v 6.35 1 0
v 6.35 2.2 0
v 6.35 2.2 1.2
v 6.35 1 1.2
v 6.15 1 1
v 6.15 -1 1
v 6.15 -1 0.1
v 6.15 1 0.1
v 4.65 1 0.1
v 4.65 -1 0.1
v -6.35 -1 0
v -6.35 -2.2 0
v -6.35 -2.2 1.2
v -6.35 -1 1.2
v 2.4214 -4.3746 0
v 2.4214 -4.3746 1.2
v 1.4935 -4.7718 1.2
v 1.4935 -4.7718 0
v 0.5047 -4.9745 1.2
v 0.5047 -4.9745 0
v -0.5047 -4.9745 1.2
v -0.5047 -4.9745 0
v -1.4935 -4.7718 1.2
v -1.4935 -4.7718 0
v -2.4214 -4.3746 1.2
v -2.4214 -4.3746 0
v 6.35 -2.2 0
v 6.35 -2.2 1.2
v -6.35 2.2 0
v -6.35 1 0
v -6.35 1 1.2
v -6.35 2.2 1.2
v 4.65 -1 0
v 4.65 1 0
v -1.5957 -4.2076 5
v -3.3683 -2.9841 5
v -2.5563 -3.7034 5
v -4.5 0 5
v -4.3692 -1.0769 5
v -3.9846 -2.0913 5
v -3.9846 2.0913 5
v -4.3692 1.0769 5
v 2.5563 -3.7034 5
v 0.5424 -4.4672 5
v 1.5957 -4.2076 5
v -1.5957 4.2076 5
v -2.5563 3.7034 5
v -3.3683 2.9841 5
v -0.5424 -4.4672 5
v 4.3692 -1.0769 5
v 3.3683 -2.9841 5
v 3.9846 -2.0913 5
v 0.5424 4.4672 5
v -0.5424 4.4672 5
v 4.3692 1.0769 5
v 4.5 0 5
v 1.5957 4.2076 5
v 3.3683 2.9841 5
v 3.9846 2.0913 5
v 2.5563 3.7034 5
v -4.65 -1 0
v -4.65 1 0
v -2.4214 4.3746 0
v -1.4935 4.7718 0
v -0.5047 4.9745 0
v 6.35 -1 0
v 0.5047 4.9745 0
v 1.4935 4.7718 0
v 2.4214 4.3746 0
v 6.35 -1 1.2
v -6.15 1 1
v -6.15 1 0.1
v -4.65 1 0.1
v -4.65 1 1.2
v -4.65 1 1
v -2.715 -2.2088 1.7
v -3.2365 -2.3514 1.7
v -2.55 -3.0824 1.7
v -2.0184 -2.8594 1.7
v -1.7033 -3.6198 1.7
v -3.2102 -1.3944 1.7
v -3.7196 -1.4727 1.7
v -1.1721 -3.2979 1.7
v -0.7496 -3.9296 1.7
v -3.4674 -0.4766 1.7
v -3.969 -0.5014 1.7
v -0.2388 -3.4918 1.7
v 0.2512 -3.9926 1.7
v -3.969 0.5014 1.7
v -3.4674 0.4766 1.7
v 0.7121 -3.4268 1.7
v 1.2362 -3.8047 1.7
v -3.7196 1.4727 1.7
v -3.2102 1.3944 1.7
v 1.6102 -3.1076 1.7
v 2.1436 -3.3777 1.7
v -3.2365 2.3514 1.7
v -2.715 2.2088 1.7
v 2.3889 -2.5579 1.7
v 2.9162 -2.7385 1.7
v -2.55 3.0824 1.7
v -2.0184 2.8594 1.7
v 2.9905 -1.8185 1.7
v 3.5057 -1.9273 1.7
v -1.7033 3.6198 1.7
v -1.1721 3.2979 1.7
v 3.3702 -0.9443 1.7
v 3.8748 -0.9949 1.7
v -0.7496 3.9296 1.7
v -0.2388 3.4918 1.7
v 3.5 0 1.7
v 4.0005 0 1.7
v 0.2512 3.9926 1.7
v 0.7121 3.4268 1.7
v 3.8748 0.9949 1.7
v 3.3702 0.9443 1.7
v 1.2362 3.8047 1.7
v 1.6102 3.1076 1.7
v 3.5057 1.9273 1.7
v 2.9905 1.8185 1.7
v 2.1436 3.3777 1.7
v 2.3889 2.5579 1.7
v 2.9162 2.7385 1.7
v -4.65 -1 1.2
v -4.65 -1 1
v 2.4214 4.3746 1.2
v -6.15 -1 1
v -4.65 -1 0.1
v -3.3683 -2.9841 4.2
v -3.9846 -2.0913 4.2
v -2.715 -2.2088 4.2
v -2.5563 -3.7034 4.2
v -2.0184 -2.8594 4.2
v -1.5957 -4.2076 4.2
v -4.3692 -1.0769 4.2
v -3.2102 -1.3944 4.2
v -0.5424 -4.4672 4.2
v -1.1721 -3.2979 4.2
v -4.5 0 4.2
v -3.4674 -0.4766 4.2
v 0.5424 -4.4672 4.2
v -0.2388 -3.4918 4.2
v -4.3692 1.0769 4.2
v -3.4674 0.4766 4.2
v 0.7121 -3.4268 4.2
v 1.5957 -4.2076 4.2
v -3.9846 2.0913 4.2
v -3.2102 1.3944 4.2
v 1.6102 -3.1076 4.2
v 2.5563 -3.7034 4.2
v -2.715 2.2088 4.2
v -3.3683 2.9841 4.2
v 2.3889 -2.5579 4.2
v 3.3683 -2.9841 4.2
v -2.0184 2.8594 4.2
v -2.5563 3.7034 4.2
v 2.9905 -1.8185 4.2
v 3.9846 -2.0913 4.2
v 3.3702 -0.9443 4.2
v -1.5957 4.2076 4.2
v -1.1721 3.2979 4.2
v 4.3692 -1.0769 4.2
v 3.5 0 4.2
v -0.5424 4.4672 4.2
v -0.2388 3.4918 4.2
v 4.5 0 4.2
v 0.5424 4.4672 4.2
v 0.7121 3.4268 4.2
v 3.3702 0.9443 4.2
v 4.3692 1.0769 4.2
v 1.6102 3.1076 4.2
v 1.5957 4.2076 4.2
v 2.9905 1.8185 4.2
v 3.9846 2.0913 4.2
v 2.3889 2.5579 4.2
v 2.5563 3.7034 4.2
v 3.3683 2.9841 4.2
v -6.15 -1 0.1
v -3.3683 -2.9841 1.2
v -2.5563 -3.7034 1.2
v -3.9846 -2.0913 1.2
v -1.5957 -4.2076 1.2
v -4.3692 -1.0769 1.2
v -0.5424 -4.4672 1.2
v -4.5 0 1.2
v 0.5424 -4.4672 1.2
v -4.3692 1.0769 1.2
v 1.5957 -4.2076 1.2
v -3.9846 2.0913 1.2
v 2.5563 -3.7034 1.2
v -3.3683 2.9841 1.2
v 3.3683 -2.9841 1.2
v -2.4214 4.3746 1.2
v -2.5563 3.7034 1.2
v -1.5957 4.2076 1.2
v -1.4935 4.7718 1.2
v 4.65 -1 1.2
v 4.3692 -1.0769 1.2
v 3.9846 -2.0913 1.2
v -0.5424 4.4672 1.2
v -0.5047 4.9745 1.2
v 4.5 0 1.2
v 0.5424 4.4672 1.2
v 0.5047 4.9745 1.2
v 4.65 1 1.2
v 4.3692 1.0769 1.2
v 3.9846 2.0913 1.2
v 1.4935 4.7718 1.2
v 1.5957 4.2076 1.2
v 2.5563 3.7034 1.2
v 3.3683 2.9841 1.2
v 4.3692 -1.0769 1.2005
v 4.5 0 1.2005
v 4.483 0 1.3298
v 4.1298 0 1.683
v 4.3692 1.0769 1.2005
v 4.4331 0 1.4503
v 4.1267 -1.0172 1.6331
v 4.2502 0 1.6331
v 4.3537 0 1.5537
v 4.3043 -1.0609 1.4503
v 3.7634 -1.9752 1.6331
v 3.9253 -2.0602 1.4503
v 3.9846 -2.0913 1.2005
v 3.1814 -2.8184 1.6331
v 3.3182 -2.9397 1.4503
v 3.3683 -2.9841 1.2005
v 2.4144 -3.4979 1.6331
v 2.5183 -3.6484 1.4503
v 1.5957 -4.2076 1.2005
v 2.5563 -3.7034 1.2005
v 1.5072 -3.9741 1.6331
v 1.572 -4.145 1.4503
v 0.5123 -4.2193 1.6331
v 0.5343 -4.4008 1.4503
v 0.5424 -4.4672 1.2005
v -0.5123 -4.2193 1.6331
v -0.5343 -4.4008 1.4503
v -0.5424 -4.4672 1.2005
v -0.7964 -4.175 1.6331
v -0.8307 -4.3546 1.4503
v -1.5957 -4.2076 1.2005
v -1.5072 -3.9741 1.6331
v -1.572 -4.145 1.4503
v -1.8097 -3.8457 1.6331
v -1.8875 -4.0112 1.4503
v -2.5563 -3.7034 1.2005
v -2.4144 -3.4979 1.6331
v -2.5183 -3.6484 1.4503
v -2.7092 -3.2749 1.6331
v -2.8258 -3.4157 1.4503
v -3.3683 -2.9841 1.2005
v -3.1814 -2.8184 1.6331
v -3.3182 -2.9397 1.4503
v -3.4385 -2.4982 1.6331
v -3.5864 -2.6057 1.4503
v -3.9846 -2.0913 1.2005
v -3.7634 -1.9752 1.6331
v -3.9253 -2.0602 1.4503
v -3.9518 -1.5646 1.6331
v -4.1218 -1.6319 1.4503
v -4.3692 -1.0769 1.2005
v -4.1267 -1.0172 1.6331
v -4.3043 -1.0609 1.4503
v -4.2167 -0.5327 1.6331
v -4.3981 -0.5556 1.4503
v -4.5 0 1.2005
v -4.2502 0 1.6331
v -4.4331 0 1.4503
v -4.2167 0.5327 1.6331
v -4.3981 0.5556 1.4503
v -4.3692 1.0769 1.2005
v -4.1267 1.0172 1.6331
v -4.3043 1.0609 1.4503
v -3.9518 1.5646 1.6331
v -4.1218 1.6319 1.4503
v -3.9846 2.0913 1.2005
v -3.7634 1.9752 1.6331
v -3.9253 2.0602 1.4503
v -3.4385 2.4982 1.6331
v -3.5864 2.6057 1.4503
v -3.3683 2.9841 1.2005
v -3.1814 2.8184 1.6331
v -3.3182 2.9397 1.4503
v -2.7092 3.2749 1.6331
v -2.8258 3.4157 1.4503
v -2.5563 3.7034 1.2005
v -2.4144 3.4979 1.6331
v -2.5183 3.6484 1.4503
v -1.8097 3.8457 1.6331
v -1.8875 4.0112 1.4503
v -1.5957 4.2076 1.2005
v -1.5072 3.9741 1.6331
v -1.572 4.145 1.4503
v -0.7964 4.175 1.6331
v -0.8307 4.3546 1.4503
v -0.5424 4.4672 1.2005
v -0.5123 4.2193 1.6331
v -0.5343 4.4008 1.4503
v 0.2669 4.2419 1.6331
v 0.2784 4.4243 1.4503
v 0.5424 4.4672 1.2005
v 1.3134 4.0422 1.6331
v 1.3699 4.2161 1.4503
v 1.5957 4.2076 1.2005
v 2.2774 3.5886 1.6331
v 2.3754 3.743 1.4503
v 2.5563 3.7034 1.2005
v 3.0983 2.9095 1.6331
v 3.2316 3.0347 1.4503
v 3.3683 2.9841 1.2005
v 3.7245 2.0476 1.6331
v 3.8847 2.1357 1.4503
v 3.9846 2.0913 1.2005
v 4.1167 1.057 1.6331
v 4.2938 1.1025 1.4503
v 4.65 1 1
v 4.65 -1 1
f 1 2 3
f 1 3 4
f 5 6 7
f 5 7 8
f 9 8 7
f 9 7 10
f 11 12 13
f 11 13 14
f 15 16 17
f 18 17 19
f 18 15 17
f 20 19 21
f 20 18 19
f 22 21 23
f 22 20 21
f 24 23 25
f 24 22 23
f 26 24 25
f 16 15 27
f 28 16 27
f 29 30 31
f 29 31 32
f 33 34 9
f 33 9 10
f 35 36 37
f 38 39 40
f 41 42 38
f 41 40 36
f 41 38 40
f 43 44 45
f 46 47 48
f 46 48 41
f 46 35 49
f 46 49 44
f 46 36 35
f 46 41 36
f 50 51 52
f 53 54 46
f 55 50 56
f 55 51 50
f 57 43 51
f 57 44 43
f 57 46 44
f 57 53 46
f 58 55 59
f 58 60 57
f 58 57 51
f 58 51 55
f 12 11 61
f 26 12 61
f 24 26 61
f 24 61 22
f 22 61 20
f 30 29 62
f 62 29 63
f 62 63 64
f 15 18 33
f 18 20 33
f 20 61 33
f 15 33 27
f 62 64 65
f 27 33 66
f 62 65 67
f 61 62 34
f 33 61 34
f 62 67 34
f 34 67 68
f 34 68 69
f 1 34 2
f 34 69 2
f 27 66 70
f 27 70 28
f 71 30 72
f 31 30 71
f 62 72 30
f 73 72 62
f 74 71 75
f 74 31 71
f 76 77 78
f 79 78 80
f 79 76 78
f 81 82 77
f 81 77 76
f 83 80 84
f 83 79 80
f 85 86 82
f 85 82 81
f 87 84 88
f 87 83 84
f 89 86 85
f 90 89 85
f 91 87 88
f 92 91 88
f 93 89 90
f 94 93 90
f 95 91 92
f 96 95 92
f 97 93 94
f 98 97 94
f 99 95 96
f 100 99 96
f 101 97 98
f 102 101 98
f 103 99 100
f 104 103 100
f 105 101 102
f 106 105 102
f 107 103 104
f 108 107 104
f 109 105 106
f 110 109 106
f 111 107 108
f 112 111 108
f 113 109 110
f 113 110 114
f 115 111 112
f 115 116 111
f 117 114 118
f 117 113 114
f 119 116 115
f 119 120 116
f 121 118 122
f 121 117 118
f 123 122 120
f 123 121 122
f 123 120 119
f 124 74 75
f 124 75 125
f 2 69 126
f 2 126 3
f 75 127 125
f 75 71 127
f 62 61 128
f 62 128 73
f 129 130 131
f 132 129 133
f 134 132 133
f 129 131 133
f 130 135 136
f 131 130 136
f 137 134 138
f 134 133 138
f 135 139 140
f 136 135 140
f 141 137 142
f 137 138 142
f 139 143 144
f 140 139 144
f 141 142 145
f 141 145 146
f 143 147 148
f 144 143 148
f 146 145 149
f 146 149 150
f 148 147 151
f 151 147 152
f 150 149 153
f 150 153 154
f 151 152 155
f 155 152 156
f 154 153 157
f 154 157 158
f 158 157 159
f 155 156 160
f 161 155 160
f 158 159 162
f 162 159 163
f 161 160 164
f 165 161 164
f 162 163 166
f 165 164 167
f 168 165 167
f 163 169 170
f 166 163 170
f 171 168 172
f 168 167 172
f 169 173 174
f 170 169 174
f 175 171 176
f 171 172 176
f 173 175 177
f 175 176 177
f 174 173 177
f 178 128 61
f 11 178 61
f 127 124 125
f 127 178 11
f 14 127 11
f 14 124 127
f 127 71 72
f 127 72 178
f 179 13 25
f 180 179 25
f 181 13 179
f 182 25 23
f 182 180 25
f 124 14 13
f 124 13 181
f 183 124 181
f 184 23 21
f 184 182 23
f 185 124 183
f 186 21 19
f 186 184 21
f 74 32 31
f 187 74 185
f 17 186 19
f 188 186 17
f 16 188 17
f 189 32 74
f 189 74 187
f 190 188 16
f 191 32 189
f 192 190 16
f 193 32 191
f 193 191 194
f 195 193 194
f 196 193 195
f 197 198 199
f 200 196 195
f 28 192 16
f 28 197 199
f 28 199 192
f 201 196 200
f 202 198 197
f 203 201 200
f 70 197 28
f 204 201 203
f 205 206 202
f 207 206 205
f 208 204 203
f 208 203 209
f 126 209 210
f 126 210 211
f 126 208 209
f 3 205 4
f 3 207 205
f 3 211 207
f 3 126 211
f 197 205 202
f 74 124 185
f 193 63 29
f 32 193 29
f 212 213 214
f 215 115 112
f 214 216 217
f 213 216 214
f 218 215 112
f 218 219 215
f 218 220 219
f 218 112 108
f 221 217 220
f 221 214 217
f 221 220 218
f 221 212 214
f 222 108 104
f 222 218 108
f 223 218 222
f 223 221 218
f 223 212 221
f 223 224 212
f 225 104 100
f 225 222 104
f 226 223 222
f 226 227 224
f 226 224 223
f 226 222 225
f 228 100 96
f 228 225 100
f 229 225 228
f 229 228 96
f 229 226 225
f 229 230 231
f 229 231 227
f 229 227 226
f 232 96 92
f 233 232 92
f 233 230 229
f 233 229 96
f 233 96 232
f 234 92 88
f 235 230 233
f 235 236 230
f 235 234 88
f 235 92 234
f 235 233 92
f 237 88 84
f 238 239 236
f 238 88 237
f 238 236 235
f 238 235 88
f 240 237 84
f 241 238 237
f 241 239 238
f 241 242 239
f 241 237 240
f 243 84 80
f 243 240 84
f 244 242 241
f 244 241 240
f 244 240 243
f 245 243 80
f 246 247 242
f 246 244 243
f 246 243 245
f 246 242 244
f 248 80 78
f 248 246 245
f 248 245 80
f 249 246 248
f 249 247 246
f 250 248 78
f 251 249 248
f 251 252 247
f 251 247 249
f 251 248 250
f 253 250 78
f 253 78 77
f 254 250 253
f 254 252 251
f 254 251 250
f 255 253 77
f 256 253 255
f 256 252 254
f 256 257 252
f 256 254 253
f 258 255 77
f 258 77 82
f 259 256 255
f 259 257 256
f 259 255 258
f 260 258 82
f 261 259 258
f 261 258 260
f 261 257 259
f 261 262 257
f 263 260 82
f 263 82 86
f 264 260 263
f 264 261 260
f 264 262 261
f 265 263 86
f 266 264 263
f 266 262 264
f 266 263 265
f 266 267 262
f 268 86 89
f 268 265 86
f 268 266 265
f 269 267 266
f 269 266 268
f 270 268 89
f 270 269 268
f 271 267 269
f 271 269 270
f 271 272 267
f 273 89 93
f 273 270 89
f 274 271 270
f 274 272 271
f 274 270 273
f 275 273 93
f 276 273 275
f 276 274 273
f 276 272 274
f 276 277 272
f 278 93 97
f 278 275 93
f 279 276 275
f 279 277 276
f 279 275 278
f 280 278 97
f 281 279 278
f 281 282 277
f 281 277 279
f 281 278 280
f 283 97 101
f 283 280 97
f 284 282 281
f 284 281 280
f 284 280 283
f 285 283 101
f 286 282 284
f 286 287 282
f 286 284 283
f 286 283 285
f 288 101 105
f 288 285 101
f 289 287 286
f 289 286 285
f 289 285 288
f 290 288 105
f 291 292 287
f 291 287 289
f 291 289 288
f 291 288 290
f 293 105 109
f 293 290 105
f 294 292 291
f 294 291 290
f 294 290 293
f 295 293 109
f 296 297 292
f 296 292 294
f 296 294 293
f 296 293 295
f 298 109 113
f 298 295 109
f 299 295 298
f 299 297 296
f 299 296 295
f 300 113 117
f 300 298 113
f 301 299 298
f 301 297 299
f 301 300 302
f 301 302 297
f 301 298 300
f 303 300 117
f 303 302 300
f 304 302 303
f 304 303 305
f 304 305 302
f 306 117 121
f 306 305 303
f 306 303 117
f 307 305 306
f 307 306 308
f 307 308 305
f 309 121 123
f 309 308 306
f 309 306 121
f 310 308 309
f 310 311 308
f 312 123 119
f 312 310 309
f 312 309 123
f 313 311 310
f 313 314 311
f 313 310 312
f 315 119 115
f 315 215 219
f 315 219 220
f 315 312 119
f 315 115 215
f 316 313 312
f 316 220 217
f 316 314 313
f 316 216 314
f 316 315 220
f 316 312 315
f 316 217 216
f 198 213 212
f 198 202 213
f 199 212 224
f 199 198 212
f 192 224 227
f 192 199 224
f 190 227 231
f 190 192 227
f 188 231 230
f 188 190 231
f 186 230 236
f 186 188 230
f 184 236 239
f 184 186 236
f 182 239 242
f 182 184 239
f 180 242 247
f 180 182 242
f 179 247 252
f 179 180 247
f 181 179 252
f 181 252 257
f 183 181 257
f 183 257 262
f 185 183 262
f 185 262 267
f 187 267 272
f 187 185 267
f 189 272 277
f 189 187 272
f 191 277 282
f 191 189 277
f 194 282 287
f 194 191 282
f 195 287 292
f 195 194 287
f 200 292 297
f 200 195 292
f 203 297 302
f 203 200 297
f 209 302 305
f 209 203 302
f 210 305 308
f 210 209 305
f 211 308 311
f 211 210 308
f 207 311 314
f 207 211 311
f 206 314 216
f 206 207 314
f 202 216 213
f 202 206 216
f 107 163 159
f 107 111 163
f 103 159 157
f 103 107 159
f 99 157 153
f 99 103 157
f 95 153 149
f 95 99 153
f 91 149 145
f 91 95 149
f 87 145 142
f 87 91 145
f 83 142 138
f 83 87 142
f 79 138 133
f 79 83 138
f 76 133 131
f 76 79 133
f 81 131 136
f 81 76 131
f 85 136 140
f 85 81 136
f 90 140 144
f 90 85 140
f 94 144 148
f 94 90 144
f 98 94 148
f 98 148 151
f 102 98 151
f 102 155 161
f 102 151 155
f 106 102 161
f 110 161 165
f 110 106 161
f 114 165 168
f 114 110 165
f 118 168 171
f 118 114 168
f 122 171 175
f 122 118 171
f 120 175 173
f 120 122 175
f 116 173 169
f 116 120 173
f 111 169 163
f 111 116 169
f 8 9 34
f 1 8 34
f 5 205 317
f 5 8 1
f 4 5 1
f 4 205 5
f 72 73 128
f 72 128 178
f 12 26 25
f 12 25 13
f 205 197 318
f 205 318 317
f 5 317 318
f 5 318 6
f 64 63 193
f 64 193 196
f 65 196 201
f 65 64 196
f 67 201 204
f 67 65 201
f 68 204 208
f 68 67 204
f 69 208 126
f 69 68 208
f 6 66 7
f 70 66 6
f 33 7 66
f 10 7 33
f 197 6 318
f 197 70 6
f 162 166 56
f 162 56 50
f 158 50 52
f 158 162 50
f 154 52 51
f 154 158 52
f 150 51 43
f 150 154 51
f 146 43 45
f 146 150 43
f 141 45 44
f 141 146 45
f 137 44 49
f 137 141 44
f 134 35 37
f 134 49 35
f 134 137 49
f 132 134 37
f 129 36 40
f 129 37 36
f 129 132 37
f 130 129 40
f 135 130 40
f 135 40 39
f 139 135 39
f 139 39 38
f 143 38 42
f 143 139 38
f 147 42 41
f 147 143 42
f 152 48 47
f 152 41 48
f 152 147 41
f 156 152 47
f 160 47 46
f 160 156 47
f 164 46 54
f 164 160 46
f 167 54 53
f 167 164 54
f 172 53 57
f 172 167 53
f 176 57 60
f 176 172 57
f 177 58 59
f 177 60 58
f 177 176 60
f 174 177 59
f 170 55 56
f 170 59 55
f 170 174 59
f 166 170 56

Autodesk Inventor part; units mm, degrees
ref_plane "YZ Plane" through (0, 0, 0) normal (1, 0, 0) x (0, 1, 0)
ref_plane "XZ Plane" through (0, 0, 0) normal (0, 1, 0) x (-1, 0, 0)
ref_plane "XY Plane" through (0, 0, 0) normal (0, 0, 1) x (1, 0, 0)
sketch "Sketch1" plane through (0, 0, 0) normal (0, 0, 1) x (1, 0, 0)
  line L0 (-6.35, 5) -> (6.35, 5)
  line L1 (6.35, 5) -> (6.35, -5)
  line L2 (6.35, -5) -> (-6.35, -5)
  line L3 (-6.35, -5) -> (-6.35, 5)
  line L4 (-6.35, 5) -> (6.35, -5) construction
  line L5 (6.35, 5) -> (-6.35, -5) construction
  line L6 (-2.4214, 4.3746) -> (-6.35, 2.2)
  line L7 (-2.4214, -4.3746) -> (-6.35, -2.2)
  line L8 (0, -5) -> (0, 5)
  line L9 (2.4214, 4.3746) -> (6.35, 2.2)
  line L10 (2.4214, -4.3746) -> (6.35, -2.2)
  line L11 (-6.35, 2.2) -> (-6.35, -2.2)
  line L12 (6.35, -2.2) -> (6.35, 2.2)
  arc A0 (-2.4214, -4.3746) -> (2.4214, -4.3746) centre (0, 0) ccw
  arc A1 (2.4214, 4.3746) -> (-2.4214, 4.3746) centre (0, 0) ccw
  point P0 (-1.2915, 5)
  point P1 (-1.2915, -5)
  point P2 (1.2915, 5)
  point P3 (1.2915, -5)
  dimension "d0" = 12.7
  dimension "d1" = 10
  dimension "d3" = 2.8
  dimension "d4" = 2.8
extrude "Extrusion1" add sketch "Sketch1" along normal blind 1.2 contours A1 L9 L1 L10 A0 L8 | L8 A0 L7 L3 L6 A1
sketch "Sketch2" plane through (0, 0, 1.2) normal (0, 0, 1) x (1, 0, 0)
  arc A0 (2.4214, 4.3746) -> (-2.4214, 4.3746) centre (0, 0) ccw projected
  circle A1 centre (0, 0) radius 3.5
  circle A2 centre (0, 0) radius 4.5
  dimension "d7" = 7
  dimension "d8" = 1
extrude "Extrusion2" add sketch "Sketch2" along normal blind 0.5 contours A1 | A2
sketch "Sketch3" plane through (0, 0, 1.7) normal (0, 0, 1) x (1, 0, 0)
  circle A0 centre (0, 0) radius 4.5 projected
  circle A1 centre (0, 0) radius 3.5
  dimension "d11" = 7
extrude "Extrusion3" add sketch "Sketch3" along normal blind 2.5 contours A1
sketch "Sketch4" plane through (0, 0, 4.2) normal (0, 0, 1) x (1, 0, 0)
  circle A0 centre (0, 0) radius 4.5
  dimension "d14" = 9
extrude "Extrusion4" add sketch "Sketch4" along normal blind 0.8
fillet "Fillet1" radius 0.5 1 edges at (-4.5, 0, 1.7)
sketch "Sketch5" plane through (0, 0, 1.2) normal (0, 0, 1) x (1, 0, 0)
  circle A0 centre (0, 0) radius 4.5 projected
  line L0 (-6.35, 2.2) -> (-6.35, -2.2) projected
  line L1 (-6.35, -2.2) -> (-2.4214, -4.3746) projected
  arc A1 (-2.4214, -4.3746) -> (2.4214, -4.3746) centre (0, 0) ccw projected
  line L2 (2.4214, -4.3746) -> (6.35, -2.2) projected
  line L3 (6.35, -2.2) -> (6.35, 2.2) projected
  line L4 (6.35, 2.2) -> (2.4214, 4.3746) projected
  arc A2 (2.4214, 4.3746) -> (-2.4214, 4.3746) centre (0, 0) ccw projected
  line L5 (-2.4214, 4.3746) -> (-6.35, 2.2) projected
  line L6 (-6.35, 2.2) -> (-6.35, -2.2) projected
  line L7 (-6.35, 1) -> (-6.15, 1)
  line L8 (-6.15, 1) -> (-6.15, -1)
  line L9 (-6.15, -1) -> (-6.35, -1)
  line L10 (-6.35, -1) -> (-6.35, 1)
  line L11 (6.35, -1) -> (6.15, -1)
  line L12 (6.15, -1) -> (6.15, 1)
  line L13 (6.15, 1) -> (6.35, 1)
  line L14 (6.35, 1) -> (6.35, -1)
  point P0 (6.35, 0)
  point P1 (-6.35, 0)
  dimension "d18" = 2
  dimension "d19" = 2
  dimension "d20" = 0.2
  dimension "d21" = 0.2
extrude "Extrusion5" cut sketch "Sketch5" against normal through all contours L7 L8 L9 L0 | L3 L11 L12 L13
sketch "Sketch6" plane through (0, 0, 1.2) normal (0, 0, 1) x (1, 0, 0)
  line L0 (-6.15, -1) -> (-6.35, -1) projected
  line L1 (-6.35, -1) -> (-6.35, -2.2) projected
  line L2 (-6.35, -2.2) -> (-2.4214, -4.3746) projected
  arc A0 (-2.4214, -4.3746) -> (2.4214, -4.3746) centre (0, 0) ccw projected
  line L3 (2.4214, -4.3746) -> (6.35, -2.2) projected
  line L4 (6.35, -2.2) -> (6.35, -1) projected
  line L5 (6.35, -1) -> (6.15, -1) projected
  line L6 (6.15, -1) -> (6.15, 1) projected
  line L7 (6.15, 1) -> (6.35, 1) projected
  line L8 (6.35, 1) -> (6.35, 2.2) projected
  line L9 (6.35, 2.2) -> (2.4214, 4.3746) projected
  arc A1 (2.4214, 4.3746) -> (-2.4214, 4.3746) centre (0, 0) ccw projected
  line L10 (-2.4214, 4.3746) -> (-6.35, 2.2) projected
  line L11 (-6.35, 2.2) -> (-6.35, 1) projected
  line L12 (-6.35, 1) -> (-6.15, 1) projected
  line L13 (-6.15, 1) -> (-6.15, -1) projected
  circle A2 centre (0, 0) radius 4.5 projected
  line L14 (-6.15, 1) -> (-4.65, 1)
  line L15 (-4.65, 1) -> (-4.65, -1)
  line L16 (-4.65, -1) -> (-6.15, -1)
  line L17 (-6.15, -1) -> (-6.15, 1)
  line L18 (6.15, -1) -> (4.65, -1)
  line L19 (4.65, -1) -> (4.65, 1)
  line L20 (4.65, 1) -> (6.15, 1)
  line L21 (6.15, 1) -> (6.15, -1)
  dimension "d24" = 1.5
  dimension "d25" = 1.5
extrude "Extrusion6" cut sketch "Sketch6" against normal blind 0.2 contours L13 L14 L15 L16 | L18 L19 L20 L6
sketch "Sketch7" plane through (0, 0, 0) normal (0, 0, -1) x (-1, 0, 0)
  circle A0 centre (0, 0) radius 4 projected
  line L0 (6.35, -1) -> (6.15, -1) projected
  line L1 (6.15, -1) -> (6.15, 1) projected
  line L2 (6.15, 1) -> (6.35, 1) projected
  line L3 (6.35, 2.2) -> (6.35, 1) projected
  line L4 (2.4214, 4.3746) -> (6.35, 2.2) projected
  arc A1 (2.4214, 4.3746) -> (-2.4214, 4.3746) centre (0, 0) ccw projected
  line L5 (-6.35, 2.2) -> (-2.4214, 4.3746) projected
  line L6 (-6.35, 1) -> (-6.35, 2.2) projected
  line L7 (-6.35, 1) -> (-6.15, 1) projected
  line L8 (-6.15, 1) -> (-6.15, -1) projected
  line L9 (-6.15, -1) -> (-6.35, -1) projected
  line L10 (-6.35, -2.2) -> (-6.35, -1) projected
  line L11 (-2.4214, -4.3746) -> (-6.35, -2.2) projected
  arc A2 (-2.4214, -4.3746) -> (2.4214, -4.3746) centre (0, 0) ccw projected
  line L12 (6.35, -2.2) -> (2.4214, -4.3746) projected
  line L13 (6.35, -1) -> (6.35, -2.2) projected
  line L14 (6.15, -1) -> (4.65, -1)
  line L15 (4.65, -1) -> (4.65, 1)
  line L16 (4.65, 1) -> (6.15, 1)
  line L17 (6.15, 1) -> (6.15, -1)
  line L18 (-6.15, 1) -> (-4.65, 1)
  line L19 (-4.65, 1) -> (-4.65, -1)
  line L20 (-4.65, -1) -> (-6.15, -1)
  line L21 (-6.15, -1) -> (-6.15, 1)
  dimension "d28" = 1.5
  dimension "d29" = 1.5
extrude "Extrusion7" cut sketch "Sketch7" against normal blind 0.1 contours L14 L15 L16 L1 | L8 L18 L19 L20
properties part number "SDR1005"
